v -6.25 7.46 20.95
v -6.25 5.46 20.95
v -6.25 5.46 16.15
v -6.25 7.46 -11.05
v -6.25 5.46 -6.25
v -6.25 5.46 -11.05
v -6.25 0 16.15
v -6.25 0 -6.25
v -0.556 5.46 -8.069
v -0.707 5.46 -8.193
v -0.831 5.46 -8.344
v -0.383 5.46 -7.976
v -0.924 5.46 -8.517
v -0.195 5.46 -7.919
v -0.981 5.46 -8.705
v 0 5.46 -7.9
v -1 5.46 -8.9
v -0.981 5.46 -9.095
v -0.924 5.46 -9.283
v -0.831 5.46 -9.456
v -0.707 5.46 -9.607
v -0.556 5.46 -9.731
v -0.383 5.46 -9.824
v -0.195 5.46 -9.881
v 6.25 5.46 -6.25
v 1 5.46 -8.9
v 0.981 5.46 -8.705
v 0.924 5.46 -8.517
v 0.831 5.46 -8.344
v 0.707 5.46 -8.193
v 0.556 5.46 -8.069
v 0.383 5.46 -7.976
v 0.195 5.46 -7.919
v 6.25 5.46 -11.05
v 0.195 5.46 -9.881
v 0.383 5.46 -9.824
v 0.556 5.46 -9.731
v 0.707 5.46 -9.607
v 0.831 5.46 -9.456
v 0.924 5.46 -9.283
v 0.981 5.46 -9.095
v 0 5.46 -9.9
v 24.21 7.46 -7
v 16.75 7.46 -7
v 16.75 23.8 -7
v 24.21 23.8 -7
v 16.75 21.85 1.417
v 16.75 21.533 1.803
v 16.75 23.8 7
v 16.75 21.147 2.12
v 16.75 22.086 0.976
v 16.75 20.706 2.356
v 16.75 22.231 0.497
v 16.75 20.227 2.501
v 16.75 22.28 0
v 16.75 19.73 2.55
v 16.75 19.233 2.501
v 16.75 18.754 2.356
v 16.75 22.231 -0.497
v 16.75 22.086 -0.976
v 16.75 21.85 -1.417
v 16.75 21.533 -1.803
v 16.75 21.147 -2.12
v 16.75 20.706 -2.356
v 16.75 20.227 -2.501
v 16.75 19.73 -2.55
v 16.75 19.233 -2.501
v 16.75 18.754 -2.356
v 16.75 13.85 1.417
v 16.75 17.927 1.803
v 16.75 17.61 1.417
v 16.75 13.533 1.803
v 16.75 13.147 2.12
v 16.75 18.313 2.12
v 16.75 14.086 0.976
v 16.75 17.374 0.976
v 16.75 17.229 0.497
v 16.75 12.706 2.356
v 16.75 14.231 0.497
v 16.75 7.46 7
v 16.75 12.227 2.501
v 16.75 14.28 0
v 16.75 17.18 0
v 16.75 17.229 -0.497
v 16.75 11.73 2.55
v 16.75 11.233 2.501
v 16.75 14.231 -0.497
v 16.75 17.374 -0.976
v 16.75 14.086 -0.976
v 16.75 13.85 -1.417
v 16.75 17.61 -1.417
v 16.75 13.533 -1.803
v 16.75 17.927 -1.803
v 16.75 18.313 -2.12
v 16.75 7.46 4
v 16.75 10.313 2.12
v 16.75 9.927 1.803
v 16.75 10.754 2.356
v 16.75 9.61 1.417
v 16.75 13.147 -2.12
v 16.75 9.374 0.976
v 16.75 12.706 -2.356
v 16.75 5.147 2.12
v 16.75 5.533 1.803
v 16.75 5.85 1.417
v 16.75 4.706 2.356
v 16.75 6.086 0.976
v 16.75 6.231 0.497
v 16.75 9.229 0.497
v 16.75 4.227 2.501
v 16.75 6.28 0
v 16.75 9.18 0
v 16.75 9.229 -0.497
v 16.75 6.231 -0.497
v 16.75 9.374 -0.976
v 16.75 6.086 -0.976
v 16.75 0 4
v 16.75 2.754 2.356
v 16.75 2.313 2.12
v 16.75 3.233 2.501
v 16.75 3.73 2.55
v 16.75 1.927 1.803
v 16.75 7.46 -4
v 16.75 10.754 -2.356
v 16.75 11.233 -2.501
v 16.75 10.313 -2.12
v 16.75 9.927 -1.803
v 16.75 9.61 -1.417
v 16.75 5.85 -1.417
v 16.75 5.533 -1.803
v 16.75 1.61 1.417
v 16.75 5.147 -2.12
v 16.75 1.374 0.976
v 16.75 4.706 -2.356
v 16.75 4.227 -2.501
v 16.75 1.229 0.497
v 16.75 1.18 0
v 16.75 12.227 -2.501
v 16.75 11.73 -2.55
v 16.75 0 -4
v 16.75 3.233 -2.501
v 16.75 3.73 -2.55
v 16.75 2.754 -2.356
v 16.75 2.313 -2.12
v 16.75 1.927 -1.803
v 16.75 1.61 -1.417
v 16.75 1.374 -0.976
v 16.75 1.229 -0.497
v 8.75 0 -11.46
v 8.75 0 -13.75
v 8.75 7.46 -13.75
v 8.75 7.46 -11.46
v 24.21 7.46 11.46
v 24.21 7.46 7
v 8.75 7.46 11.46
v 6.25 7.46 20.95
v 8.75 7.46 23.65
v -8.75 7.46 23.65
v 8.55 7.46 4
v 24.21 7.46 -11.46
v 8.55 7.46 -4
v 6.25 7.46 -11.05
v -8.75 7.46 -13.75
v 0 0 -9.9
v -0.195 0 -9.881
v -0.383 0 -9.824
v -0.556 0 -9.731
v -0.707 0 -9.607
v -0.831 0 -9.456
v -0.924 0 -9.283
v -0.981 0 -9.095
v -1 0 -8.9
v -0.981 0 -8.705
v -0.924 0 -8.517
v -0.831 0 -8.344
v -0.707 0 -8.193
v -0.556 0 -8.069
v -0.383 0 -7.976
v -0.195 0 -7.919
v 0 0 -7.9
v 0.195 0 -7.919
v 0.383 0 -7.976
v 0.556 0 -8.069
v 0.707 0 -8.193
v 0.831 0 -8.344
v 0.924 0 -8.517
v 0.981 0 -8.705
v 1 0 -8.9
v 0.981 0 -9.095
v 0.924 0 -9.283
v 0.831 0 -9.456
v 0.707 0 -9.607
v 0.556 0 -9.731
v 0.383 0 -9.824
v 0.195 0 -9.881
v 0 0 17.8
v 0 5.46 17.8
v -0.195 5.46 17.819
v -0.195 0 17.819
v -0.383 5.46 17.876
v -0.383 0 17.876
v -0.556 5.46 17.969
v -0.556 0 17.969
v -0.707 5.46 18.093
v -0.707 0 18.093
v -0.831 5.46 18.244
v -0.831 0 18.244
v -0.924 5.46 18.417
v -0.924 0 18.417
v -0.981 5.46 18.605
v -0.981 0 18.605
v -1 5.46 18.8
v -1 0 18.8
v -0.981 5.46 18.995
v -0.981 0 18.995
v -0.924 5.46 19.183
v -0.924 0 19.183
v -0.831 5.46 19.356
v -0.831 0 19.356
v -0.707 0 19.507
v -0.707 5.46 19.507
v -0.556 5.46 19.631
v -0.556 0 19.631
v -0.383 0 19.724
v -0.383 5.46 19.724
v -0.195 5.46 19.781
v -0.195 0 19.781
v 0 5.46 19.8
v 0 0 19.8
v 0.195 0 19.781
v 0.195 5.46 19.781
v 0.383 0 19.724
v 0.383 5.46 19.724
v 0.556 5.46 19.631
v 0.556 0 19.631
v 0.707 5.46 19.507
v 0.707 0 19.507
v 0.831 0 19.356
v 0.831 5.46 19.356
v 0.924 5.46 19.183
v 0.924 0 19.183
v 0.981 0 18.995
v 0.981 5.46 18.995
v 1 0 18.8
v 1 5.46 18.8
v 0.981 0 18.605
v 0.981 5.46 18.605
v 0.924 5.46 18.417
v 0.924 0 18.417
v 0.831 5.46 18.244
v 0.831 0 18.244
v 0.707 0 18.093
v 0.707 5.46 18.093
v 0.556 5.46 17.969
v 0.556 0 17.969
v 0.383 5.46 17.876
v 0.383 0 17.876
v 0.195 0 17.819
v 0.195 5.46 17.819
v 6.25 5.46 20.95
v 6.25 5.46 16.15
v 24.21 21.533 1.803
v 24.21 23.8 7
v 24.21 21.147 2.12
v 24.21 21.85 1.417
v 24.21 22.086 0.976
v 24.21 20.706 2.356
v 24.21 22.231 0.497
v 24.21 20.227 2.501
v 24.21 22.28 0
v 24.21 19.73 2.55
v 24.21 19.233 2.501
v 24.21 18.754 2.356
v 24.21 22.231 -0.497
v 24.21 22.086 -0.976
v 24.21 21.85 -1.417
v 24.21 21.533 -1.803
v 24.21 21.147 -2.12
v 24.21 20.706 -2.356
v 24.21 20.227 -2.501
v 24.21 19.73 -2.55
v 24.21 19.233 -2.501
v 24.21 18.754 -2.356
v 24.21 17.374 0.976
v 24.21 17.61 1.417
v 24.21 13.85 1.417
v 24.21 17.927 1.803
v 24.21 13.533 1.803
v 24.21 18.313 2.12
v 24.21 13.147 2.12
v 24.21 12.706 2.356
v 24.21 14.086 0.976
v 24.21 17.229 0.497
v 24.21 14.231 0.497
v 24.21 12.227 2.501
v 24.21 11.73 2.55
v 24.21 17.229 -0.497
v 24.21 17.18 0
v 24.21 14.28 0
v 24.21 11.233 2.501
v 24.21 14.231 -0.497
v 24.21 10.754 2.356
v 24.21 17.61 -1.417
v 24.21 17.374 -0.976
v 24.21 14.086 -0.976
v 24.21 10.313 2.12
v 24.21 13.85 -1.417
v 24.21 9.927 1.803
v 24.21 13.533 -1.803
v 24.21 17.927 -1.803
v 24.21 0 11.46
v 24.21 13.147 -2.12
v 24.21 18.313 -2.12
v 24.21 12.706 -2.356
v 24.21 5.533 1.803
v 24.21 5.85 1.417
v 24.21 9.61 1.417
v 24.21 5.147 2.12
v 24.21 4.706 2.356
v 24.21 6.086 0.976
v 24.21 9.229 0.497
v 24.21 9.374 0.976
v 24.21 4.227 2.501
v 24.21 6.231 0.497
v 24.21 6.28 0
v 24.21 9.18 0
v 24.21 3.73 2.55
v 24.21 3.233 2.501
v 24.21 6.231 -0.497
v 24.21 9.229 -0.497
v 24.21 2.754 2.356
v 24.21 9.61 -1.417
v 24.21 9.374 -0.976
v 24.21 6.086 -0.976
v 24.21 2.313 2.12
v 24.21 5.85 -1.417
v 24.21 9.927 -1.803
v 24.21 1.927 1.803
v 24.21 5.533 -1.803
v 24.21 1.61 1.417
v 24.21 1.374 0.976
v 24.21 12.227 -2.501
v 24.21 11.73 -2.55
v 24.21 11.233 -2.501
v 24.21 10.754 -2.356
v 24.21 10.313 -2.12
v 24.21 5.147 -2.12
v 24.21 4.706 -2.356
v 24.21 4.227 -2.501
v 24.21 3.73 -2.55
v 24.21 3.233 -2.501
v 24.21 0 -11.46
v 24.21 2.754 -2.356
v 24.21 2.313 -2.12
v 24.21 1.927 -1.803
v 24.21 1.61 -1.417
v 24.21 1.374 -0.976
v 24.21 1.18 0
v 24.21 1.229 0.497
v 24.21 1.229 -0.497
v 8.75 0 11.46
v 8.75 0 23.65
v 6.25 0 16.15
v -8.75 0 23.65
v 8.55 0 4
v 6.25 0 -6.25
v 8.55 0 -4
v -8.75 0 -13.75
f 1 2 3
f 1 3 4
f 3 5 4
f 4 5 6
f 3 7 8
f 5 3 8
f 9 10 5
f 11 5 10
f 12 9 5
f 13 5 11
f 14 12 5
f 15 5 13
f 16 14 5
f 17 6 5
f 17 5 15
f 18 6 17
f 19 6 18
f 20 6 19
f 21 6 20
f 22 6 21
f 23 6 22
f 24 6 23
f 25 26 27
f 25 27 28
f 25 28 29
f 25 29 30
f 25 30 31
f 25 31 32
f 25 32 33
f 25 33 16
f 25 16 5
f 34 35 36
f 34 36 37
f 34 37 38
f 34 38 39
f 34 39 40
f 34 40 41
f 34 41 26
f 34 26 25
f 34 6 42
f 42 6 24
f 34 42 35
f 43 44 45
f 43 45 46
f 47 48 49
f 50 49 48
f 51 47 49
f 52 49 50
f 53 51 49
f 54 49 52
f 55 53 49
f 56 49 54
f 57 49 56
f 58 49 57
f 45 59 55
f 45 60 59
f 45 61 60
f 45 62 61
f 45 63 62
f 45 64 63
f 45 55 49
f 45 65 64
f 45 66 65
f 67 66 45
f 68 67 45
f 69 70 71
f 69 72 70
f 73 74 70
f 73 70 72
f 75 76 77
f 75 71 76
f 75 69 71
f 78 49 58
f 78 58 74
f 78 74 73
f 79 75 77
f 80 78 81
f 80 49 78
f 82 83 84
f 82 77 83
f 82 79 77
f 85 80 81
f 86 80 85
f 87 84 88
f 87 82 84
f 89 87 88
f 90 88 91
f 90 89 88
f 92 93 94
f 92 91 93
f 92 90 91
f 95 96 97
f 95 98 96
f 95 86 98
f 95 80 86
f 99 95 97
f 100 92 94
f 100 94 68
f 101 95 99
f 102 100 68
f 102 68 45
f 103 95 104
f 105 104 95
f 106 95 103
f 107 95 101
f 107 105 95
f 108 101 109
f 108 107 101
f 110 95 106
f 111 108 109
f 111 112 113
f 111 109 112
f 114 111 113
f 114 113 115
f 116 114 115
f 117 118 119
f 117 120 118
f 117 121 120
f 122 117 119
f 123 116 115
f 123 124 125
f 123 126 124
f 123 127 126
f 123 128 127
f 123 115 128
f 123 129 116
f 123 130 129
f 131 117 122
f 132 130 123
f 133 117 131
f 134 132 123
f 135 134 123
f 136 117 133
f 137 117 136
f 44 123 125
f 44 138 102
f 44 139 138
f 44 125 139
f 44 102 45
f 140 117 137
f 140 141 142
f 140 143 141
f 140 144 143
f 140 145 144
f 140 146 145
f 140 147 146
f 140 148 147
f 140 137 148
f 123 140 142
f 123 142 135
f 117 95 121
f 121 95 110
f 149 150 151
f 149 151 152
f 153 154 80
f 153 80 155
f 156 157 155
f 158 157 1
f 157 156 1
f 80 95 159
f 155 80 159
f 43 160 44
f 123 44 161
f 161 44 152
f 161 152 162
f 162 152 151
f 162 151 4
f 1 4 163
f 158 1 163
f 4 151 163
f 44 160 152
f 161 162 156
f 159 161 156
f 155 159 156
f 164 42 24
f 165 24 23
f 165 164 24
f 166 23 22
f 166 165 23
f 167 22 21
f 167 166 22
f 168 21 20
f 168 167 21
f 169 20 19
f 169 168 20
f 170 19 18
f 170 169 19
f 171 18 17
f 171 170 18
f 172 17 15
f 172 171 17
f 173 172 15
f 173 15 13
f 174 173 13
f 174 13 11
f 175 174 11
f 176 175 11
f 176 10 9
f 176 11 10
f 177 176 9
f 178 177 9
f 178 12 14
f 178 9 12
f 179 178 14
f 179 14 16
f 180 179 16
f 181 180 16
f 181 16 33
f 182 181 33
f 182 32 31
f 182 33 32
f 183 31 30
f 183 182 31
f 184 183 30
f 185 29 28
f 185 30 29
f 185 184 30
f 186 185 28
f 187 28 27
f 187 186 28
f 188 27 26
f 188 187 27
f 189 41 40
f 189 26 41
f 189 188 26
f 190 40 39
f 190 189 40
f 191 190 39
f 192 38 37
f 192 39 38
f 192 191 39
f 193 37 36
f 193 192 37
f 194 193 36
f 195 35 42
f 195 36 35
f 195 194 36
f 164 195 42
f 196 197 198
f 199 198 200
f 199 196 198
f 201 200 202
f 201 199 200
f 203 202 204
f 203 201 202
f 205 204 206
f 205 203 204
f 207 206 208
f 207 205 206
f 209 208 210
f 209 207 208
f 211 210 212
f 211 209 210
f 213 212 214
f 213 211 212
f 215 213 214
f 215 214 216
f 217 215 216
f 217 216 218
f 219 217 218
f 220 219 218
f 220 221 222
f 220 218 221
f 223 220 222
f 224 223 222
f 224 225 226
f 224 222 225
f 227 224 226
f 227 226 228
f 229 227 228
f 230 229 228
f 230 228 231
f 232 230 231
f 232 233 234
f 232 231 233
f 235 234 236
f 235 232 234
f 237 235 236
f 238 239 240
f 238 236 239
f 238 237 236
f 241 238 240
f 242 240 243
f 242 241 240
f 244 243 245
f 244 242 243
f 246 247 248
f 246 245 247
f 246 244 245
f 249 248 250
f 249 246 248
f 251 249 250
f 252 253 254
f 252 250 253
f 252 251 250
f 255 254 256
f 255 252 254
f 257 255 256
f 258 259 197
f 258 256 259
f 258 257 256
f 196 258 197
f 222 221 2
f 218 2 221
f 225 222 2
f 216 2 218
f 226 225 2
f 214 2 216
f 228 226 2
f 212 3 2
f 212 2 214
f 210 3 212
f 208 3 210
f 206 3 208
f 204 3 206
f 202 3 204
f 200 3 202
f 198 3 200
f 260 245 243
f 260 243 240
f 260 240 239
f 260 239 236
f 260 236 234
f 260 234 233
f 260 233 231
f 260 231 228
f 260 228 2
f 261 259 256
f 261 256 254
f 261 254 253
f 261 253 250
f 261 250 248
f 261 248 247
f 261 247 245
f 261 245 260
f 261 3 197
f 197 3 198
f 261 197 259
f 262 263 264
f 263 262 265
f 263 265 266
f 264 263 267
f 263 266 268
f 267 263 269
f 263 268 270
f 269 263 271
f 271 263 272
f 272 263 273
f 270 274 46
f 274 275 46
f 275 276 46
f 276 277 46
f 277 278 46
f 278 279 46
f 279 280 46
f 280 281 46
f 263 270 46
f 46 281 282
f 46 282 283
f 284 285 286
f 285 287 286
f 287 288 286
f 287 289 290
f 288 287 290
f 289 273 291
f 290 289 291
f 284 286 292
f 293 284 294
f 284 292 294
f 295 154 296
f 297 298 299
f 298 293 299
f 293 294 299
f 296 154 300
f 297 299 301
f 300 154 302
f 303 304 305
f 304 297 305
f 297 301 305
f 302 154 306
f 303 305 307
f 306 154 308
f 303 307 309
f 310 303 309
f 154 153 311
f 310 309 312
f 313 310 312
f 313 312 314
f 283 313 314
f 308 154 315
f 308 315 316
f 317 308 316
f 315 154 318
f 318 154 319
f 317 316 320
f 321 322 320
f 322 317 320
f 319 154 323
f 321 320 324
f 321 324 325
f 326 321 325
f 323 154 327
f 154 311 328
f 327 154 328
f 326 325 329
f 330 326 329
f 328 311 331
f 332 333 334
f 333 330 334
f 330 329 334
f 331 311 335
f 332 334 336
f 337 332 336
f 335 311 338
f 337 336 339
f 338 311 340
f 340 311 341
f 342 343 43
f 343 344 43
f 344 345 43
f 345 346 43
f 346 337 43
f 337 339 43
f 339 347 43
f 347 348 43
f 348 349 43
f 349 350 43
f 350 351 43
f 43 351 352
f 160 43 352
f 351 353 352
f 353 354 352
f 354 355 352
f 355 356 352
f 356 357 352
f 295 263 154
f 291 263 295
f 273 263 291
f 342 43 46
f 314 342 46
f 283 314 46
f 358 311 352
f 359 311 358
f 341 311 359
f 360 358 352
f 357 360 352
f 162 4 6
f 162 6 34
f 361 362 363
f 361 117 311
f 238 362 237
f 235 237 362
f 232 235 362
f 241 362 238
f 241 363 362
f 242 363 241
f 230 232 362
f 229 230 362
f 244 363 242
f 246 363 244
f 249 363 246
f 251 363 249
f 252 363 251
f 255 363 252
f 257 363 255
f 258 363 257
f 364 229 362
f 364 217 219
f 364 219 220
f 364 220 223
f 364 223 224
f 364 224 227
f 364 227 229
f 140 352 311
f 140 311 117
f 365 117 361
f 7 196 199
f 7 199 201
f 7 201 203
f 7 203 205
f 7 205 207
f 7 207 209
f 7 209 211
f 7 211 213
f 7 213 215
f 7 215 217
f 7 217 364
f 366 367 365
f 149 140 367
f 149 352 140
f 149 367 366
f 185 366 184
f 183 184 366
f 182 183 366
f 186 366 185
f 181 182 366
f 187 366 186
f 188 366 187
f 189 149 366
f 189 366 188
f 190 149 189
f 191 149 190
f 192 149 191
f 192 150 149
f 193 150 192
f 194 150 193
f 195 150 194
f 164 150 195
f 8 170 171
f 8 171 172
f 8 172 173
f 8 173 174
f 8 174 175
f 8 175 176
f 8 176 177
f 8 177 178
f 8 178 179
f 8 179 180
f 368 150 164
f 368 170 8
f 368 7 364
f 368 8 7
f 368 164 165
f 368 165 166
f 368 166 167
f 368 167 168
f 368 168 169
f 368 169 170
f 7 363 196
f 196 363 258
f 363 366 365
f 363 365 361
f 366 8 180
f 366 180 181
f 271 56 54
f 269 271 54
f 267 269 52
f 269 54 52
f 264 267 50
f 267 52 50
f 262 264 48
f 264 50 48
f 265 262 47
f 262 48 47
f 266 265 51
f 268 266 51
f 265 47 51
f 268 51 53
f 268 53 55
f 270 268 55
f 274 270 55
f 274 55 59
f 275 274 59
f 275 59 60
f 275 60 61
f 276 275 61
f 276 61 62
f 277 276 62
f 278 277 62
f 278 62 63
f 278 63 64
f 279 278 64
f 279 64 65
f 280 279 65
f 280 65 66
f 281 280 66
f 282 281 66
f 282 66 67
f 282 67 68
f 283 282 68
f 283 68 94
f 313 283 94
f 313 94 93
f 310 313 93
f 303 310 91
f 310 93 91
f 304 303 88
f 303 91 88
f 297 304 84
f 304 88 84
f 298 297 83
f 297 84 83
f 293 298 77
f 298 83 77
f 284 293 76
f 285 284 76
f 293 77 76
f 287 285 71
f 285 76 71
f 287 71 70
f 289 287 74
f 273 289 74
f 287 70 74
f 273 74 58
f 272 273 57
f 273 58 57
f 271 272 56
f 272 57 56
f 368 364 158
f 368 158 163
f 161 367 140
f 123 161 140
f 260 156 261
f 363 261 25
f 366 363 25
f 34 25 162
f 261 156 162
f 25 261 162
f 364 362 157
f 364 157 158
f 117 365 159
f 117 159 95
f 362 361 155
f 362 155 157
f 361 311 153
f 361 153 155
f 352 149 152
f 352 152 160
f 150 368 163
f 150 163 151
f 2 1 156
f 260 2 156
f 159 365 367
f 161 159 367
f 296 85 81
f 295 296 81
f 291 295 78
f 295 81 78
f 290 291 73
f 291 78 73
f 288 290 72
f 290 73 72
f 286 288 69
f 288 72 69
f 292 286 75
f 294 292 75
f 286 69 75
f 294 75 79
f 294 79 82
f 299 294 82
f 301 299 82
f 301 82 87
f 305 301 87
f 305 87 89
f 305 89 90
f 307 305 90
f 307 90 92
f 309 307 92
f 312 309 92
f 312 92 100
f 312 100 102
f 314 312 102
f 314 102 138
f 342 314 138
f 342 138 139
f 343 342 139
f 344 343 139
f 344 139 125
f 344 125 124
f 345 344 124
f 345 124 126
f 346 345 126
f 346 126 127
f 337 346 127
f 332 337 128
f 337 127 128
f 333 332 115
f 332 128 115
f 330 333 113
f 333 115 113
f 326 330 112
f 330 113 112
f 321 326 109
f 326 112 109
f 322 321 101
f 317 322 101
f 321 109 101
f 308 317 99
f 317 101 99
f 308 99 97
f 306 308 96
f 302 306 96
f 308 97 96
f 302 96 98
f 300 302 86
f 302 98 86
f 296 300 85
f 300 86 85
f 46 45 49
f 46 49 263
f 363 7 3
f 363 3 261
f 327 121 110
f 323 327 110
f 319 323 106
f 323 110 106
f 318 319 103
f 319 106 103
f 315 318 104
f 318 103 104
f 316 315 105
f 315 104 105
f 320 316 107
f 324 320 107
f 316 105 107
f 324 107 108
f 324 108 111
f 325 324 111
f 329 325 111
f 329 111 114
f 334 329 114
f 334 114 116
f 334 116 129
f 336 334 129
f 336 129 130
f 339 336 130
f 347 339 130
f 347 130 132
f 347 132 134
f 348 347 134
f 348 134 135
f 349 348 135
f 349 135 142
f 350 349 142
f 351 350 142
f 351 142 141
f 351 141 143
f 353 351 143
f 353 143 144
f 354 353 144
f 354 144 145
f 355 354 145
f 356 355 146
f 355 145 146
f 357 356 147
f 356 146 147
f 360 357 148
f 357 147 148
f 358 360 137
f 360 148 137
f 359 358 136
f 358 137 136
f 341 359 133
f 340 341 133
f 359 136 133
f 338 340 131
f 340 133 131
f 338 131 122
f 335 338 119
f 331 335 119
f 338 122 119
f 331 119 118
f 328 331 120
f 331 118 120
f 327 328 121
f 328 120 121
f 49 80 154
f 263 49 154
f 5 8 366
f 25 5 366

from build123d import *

# Parameters (mm, degrees)
SKETCH4_R           = 1
SKETCH4_W           = 8.2
SKETCH4_H           = 8
SKETCH4_W_2         = 12.5
SKETCH4_H_2         = 22.4
BOSS_EXTRUDE2_DEPTH = 7.46
SKETCH8_W           = 7.46
SKETCH8_H           = 14
BOSS_EXTRUDE4_DEPTH = 16.34
SKETCH9_R           = 2.55
CUT_EXTRUDE2_DEPTH  = 43.142763317
SKETCH12_W          = 12.5
SKETCH12_H          = 32
CUT_EXTRUDE5_DEPTH  = 2


with BuildPart() as part:
    # Sketch4 → Boss-Extrude2 (new body)
    with BuildSketch(Plane(origin=(0, 0, 0), x_dir=(1, 0, 0), z_dir=(0, 1, 0))):
        Polygon((8.75, 11.46), (24.21, 11.46), (24.21, -11.46), (8.75, -11.46), (8.75, -23.65), (-8.75, -23.65), (-8.75, 13.75), (8.75, 13.75), align=None)
        with Locations(Location((0, 8.9, 0), (0, 0, 90))):
            Circle(SKETCH4_R, mode=Mode.SUBTRACT)
        with Locations(Location((0, -18.8, 0), (0, 0, 90))):
            Circle(SKETCH4_R, mode=Mode.SUBTRACT)
        with Locations((12.65, 0)):
            Rectangle(SKETCH4_W, SKETCH4_H, mode=Mode.SUBTRACT)
        with Locations((0, -4.95)):
            Rectangle(SKETCH4_W_2, SKETCH4_H_2, mode=Mode.SUBTRACT)
    extrude(amount=BOSS_EXTRUDE2_DEPTH)

    # Sketch8 → Boss-Extrude4 (add)
    with BuildSketch(Plane(origin=(0, 7.46, 0), x_dir=(1, 0, 0), z_dir=(0, 1, 0))):
        with Locations((20.48, 0)):
            Rectangle(SKETCH8_W, SKETCH8_H)
    extrude(amount=BOSS_EXTRUDE4_DEPTH)

    # Sketch9 → Cut-Extrude2 (cut, through all)
    with BuildSketch(Plane.ZY.offset(-16.75)):
        with Locations((0, 3.73)):
            Circle(SKETCH9_R)
        with Locations((0, 11.73)):
            Circle(SKETCH9_R)
        with Locations((0, 19.73)):
            Circle(SKETCH9_R)
    extrude(amount=-CUT_EXTRUDE2_DEPTH, mode=Mode.SUBTRACT)

    # Sketch12 → Cut-Extrude5 (cut)
    with BuildSketch(Plane(origin=(0, 7.46, 0), x_dir=(1, 0, 0), z_dir=(0, 1, 0))):
        with Locations((0, -4.95)):
            Rectangle(SKETCH12_W, SKETCH12_H)
    extrude(amount=-CUT_EXTRUDE5_DEPTH, mode=Mode.SUBTRACT)


solid = part.part
